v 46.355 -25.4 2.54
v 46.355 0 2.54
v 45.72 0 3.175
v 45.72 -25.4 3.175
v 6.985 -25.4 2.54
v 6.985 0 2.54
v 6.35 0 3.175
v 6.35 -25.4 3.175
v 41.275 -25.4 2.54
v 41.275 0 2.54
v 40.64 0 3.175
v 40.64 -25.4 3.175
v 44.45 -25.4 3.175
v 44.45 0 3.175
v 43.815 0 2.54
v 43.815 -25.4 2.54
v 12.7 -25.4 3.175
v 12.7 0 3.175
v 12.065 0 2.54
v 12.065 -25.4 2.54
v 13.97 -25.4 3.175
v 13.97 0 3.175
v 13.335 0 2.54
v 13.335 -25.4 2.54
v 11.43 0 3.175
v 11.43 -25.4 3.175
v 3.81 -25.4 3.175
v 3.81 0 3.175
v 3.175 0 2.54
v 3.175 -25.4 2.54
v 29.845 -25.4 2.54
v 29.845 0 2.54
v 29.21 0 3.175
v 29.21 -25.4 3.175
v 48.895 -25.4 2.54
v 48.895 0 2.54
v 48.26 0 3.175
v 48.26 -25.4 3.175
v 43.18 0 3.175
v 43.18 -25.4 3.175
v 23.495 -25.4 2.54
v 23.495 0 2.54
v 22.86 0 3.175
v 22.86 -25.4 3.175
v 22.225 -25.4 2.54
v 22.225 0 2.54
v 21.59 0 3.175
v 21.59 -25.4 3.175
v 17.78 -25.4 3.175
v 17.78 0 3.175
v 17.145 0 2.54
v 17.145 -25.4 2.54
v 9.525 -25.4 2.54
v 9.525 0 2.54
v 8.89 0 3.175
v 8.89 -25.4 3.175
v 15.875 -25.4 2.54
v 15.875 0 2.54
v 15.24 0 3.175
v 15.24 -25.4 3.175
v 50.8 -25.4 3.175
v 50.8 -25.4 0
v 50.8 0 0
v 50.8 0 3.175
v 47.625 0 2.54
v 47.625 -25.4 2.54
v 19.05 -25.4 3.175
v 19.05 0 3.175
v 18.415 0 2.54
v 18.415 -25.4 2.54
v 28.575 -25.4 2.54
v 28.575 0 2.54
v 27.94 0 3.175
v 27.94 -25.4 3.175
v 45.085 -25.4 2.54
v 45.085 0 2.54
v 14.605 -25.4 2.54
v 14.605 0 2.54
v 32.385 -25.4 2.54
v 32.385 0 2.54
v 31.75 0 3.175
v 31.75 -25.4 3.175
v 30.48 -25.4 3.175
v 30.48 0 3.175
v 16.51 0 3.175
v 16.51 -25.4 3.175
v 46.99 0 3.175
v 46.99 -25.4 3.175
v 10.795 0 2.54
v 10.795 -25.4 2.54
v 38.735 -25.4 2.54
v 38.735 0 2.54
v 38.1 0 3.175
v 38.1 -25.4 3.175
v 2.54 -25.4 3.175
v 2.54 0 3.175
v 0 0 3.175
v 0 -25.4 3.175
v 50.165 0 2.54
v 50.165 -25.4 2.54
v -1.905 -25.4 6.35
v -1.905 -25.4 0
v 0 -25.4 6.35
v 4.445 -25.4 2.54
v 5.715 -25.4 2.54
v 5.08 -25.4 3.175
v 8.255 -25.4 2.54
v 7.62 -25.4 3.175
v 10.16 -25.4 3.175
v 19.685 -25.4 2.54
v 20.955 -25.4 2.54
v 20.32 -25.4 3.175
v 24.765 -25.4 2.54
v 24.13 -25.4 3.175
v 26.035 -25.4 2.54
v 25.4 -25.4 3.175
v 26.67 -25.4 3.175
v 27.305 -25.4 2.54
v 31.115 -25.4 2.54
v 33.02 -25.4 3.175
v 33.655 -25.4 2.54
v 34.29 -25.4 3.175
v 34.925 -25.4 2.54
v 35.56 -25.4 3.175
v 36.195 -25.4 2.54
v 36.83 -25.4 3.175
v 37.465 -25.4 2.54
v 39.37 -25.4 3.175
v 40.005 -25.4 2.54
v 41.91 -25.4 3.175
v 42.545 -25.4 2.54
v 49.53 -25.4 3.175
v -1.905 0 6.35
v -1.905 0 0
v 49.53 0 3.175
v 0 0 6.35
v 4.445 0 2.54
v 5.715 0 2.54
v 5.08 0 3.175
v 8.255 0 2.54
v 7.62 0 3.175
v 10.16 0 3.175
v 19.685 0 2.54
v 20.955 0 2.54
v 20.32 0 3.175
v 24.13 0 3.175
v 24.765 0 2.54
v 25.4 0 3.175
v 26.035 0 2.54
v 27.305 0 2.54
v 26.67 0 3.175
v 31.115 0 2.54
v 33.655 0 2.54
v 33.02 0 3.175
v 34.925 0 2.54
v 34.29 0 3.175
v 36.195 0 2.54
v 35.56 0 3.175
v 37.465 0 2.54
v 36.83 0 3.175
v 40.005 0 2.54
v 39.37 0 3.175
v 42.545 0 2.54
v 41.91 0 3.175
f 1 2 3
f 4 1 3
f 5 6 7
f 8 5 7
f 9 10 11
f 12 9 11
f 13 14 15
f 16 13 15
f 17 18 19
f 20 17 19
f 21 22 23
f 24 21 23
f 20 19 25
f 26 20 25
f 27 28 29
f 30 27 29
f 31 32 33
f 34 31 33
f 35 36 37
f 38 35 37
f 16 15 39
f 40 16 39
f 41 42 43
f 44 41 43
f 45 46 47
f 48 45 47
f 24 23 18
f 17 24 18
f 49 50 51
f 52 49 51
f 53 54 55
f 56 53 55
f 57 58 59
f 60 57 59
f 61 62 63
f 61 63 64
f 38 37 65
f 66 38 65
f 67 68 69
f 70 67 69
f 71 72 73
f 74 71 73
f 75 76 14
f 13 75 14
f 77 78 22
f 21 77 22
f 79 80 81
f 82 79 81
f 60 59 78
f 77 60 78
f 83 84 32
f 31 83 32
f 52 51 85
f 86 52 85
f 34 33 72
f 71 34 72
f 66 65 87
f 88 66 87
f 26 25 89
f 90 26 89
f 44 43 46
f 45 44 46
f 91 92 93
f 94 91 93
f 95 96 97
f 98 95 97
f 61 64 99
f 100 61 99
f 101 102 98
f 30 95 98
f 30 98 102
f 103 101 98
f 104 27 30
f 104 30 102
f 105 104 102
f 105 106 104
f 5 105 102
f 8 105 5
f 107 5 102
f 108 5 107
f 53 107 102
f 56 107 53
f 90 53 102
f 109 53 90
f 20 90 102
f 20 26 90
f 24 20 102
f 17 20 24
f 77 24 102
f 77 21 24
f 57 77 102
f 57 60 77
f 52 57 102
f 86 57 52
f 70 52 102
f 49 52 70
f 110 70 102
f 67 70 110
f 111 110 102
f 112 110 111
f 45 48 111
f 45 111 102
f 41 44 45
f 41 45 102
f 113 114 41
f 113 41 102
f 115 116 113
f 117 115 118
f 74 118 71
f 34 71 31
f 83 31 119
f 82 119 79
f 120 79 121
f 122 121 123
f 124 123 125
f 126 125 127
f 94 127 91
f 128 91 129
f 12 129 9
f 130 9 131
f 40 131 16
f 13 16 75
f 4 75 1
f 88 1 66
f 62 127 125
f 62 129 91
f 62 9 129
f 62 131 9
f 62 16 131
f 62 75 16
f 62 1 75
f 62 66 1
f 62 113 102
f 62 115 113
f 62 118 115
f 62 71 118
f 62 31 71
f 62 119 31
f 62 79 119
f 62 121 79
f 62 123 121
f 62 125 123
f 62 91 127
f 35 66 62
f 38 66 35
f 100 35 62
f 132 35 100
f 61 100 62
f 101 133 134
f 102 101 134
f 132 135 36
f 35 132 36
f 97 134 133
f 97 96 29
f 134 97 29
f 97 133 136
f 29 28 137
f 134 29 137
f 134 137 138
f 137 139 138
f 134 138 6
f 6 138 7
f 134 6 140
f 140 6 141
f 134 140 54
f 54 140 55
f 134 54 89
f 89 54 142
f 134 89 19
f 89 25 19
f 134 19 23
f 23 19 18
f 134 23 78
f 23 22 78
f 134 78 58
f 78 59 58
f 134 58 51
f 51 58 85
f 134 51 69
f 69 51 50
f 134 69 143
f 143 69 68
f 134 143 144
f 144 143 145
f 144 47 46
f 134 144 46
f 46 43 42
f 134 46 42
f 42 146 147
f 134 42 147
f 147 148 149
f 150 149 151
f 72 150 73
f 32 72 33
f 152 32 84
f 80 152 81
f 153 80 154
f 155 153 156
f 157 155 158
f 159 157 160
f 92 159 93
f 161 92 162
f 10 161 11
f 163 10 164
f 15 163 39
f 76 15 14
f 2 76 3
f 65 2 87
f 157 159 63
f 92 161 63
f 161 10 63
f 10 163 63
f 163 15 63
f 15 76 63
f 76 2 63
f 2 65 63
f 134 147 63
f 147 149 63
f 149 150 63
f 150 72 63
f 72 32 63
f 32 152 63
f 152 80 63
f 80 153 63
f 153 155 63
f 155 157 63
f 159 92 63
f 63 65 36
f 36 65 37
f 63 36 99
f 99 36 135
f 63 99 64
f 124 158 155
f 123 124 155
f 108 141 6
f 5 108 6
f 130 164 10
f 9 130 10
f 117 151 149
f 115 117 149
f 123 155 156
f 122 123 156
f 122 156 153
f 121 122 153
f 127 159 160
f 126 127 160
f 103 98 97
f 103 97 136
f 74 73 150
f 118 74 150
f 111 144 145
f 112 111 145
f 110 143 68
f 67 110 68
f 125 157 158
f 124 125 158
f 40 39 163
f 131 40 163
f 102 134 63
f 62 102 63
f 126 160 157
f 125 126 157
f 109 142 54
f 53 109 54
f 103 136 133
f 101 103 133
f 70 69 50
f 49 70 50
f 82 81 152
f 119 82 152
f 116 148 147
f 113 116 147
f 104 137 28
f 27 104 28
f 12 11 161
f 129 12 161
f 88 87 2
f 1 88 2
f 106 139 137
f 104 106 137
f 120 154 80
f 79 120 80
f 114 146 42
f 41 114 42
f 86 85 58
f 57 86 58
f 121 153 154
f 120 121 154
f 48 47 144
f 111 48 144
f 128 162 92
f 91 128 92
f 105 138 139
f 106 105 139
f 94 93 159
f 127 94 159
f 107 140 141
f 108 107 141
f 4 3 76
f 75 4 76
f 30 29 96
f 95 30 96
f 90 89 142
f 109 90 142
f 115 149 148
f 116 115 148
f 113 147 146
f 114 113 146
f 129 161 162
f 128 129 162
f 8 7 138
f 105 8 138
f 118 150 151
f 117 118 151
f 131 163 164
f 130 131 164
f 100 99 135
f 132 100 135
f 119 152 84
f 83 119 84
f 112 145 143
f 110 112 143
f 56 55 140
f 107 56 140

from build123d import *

# Parameters (mm, degrees)
F1_DEPTH = 25.4


with BuildPart() as f1:
    # F0 (on Front) → F1 (new body)
    with BuildSketch(Plane.XZ):
        Polygon((-1.905, 0), (0, 0), (50.8, 0), (50.8, 3.175), (50.165, 2.54), (49.53, 3.175), (48.895, 2.54), (48.26, 3.175), (47.625, 2.54), (46.99, 3.175), (46.355, 2.54), (45.72, 3.175), (45.085, 2.54), (44.45, 3.175), (43.815, 2.54), (43.18, 3.175), (42.545, 2.54), (41.91, 3.175), (41.275, 2.54), (40.64, 3.175), (40.005, 2.54), (39.37, 3.175), (38.735, 2.54), (38.1, 3.175), (37.465, 2.54), (36.83, 3.175), (36.195, 2.54), (35.56, 3.175), (34.925, 2.54), (34.29, 3.175), (33.655, 2.54), (33.02, 3.175), (32.385, 2.54), (31.75, 3.175), (31.115, 2.54), (30.48, 3.175), (29.845, 2.54), (29.21, 3.175), (28.575, 2.54), (27.94, 3.175), (27.305, 2.54), (26.67, 3.175), (26.035, 2.54), (25.4, 3.175), (24.765, 2.54), (24.13, 3.175), (23.495, 2.54), (22.86, 3.175), (22.225, 2.54), (21.59, 3.175), (20.955, 2.54), (20.32, 3.175), (19.685, 2.54), (19.05, 3.175), (18.415, 2.54), (17.78, 3.175), (17.145, 2.54), (16.51, 3.175), (15.875, 2.54), (15.24, 3.175), (14.605, 2.54), (13.97, 3.175), (13.335, 2.54), (12.7, 3.175), (12.065, 2.54), (11.43, 3.175), (10.795, 2.54), (10.16, 3.175), (9.525, 2.54), (8.89, 3.175), (8.255, 2.54), (7.62, 3.175), (6.985, 2.54), (6.35, 3.175), (5.715, 2.54), (5.08, 3.175), (4.445, 2.54), (3.81, 3.175), (3.175, 2.54), (2.54, 3.175), (0, 3.175), (0, 6.35), (-1.905, 6.35), align=None)
    extrude(amount=F1_DEPTH)


solid = f1.part
